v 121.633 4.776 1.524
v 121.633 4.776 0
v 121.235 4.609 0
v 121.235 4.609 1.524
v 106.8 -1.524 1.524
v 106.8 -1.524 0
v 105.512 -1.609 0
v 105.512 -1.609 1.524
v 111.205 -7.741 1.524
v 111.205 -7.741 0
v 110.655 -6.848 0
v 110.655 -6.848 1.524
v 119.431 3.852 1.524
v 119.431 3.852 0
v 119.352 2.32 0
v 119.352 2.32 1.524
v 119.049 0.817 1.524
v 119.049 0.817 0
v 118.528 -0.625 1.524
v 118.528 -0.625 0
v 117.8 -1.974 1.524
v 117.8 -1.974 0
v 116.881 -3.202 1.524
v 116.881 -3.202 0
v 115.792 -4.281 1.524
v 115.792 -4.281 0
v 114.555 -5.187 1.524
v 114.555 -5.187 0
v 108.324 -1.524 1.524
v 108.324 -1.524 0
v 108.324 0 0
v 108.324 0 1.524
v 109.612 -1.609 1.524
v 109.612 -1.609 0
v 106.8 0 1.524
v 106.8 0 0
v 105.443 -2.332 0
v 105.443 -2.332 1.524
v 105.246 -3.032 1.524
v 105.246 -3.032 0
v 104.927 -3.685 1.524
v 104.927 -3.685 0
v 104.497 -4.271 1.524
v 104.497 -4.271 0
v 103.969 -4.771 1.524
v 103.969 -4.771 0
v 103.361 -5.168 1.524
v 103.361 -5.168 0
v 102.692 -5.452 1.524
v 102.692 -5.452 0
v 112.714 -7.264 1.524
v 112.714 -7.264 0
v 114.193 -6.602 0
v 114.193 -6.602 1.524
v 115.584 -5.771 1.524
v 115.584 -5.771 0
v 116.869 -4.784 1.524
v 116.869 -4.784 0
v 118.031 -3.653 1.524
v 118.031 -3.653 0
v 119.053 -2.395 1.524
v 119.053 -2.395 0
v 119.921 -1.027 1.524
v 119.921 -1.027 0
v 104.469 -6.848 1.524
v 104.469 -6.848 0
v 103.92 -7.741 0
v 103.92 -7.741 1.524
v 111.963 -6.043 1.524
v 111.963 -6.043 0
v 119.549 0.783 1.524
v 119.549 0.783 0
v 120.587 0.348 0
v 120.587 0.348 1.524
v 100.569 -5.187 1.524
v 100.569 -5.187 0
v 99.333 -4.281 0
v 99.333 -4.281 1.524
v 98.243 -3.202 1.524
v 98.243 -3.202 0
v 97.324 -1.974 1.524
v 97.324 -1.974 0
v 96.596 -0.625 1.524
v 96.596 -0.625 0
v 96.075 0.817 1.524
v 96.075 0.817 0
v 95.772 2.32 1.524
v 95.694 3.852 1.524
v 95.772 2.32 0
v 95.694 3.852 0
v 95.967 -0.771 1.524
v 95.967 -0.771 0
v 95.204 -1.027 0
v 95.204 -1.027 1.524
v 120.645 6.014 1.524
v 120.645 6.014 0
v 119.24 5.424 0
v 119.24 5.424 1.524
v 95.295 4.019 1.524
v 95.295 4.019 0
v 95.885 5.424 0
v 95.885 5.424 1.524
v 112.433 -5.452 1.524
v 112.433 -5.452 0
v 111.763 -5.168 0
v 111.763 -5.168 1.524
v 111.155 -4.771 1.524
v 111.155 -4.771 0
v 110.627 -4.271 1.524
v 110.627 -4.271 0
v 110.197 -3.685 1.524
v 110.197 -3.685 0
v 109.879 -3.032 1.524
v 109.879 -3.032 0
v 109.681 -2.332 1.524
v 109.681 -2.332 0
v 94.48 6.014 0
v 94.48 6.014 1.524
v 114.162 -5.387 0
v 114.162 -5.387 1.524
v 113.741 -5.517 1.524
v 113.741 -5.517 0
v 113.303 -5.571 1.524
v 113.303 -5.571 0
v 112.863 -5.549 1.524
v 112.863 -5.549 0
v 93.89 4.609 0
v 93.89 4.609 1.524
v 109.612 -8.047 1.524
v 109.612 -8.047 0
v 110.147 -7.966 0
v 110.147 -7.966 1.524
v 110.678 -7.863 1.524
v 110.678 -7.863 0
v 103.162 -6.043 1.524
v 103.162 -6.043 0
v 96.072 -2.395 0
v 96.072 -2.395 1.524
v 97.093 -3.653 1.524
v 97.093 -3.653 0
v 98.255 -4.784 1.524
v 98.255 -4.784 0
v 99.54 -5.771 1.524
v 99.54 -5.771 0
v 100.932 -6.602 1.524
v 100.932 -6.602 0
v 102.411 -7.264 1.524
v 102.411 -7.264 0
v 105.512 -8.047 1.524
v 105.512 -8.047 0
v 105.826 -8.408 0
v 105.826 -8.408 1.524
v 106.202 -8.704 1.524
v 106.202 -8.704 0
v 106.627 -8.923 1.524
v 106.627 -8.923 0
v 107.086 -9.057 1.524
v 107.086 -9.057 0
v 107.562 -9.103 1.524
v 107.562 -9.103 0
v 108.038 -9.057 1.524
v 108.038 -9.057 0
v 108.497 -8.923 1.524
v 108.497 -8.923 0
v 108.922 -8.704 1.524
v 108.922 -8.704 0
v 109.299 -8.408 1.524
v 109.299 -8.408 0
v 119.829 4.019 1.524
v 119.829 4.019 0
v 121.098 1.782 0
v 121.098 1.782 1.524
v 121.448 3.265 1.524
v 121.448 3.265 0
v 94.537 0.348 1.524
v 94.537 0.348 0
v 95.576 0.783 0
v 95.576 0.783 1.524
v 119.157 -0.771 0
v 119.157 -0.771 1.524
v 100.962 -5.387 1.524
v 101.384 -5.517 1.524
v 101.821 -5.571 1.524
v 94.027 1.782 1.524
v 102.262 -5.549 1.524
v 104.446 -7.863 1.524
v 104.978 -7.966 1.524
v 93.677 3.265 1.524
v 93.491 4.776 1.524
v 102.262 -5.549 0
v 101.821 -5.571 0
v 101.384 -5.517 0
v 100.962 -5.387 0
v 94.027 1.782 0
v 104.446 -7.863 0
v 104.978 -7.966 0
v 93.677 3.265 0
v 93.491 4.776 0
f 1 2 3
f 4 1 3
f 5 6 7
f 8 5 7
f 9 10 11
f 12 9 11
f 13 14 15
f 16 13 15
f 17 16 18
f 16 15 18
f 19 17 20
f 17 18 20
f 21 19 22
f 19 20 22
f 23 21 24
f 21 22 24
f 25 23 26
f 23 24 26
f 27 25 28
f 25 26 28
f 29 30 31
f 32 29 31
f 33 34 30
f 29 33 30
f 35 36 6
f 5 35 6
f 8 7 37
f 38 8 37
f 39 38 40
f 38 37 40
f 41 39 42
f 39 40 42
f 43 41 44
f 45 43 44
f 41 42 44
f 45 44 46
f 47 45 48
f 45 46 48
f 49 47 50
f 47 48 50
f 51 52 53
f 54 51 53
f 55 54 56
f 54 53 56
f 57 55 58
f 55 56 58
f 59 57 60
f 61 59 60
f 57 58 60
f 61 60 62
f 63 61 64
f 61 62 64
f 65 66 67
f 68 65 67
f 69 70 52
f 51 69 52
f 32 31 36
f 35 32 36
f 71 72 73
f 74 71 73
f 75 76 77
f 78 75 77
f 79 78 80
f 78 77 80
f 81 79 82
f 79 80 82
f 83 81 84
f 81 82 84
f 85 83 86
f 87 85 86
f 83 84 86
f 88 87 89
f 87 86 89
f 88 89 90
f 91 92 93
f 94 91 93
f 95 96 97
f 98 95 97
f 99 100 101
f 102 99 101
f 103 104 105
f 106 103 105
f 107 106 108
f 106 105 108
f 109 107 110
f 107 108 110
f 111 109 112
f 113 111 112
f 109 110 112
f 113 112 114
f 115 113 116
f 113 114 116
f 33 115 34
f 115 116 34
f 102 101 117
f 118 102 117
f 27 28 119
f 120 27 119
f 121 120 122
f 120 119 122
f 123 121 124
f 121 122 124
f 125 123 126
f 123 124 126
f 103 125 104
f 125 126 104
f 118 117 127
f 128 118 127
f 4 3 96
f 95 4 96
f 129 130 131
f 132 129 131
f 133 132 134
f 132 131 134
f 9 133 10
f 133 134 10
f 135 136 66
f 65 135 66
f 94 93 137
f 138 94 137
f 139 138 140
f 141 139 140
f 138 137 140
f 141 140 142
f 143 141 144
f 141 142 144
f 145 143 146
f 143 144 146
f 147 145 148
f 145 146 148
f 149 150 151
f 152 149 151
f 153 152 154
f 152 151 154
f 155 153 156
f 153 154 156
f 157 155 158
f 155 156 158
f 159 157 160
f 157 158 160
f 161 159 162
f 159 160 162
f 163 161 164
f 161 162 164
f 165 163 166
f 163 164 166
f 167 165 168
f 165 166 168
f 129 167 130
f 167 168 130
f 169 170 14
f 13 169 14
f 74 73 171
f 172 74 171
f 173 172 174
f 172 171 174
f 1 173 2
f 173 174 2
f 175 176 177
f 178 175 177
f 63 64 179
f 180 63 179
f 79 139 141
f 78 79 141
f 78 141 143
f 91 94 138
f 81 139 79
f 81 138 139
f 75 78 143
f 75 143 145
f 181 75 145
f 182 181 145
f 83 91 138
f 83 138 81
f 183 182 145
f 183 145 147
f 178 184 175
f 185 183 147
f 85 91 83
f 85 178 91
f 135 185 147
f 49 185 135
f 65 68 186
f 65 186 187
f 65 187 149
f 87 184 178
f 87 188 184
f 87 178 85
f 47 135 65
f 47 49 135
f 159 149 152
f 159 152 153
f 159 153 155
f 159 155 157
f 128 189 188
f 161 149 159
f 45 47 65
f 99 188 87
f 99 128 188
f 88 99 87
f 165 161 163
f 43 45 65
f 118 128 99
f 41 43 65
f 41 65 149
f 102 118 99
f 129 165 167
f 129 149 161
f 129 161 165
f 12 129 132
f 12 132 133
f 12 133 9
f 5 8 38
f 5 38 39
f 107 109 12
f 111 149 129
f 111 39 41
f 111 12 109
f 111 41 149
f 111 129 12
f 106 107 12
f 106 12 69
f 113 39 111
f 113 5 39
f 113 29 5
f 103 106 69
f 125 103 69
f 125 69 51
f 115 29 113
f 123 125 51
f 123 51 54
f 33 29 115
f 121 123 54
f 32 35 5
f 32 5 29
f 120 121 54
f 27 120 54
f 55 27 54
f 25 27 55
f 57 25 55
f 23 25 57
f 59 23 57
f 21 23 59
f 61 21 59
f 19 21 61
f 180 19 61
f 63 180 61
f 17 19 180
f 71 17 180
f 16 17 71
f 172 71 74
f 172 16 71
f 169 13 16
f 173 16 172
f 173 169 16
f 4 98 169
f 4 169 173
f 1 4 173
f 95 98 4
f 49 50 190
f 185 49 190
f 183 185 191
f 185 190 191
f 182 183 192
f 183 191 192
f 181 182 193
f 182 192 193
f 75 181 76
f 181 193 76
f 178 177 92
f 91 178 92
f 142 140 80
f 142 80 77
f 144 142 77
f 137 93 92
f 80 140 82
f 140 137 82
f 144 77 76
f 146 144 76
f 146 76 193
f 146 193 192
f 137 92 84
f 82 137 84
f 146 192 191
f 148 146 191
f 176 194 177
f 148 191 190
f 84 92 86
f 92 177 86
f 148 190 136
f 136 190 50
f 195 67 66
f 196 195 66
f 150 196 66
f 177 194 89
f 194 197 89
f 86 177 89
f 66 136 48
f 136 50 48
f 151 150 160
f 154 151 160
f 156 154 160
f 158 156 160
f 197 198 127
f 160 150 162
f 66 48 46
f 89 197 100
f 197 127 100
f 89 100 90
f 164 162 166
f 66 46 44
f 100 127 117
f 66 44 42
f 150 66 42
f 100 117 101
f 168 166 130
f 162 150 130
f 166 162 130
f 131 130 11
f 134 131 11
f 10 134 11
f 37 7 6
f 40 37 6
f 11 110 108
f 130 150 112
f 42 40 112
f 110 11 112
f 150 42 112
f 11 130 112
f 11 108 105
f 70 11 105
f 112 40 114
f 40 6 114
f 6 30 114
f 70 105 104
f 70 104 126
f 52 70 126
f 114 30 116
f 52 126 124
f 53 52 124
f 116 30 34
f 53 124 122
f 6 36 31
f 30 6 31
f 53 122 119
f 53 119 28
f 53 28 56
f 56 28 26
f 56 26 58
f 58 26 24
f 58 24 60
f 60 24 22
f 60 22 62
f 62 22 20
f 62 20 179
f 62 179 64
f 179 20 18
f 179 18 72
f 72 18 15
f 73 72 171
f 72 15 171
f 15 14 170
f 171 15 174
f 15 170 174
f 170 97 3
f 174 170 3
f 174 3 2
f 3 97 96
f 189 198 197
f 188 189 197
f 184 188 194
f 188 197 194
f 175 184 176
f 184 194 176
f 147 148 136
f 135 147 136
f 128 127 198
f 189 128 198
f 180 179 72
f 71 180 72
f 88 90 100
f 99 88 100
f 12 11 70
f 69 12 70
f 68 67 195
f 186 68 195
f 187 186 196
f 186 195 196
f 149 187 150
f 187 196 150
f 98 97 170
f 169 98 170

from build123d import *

# Parameters (mm, degrees)
BOSS_EXTRUDE1_DEPTH = 1.524


with BuildPart() as part:
    # Sketch1 → Boss-Extrude1 (new body)
    with BuildSketch(Plane.XY):
        with BuildLine():
            Line((108.324157749, 0), (107.562157749, 0))
            Line((107.562157749, 0), (106.800157749, 0))
            Line((106.800157749, 0), (106.800157749, -1.524))
            Line((106.800157749, -1.524), (105.512237426, -1.608526345))
            ThreePointArc((105.512237426, -1.608526345), (104.724998688, -3.987284572), (102.691709144, -5.451514459))
            ThreePointArc((102.691709144, -5.451514459), (101.601320714, -5.553518588), (100.569337767, -5.186963043))
            ThreePointArc((100.569337767, -5.186963043), (96.93524901, -1.312980348), (95.693576873, 3.851571261))
            Line((95.693576873, 3.851571261), (95.294914698, 4.01890801))
            Line((95.294914698, 4.01890801), (95.88475327, 5.424136269))
            Line((95.88475327, 5.424136269), (94.479525012, 6.013974841))
            Line((94.479525012, 6.013974841), (93.889686439, 4.608746583))
            Line((93.889686439, 4.608746583), (93.491024264, 4.776083332))
            ThreePointArc((93.491024264, 4.776083332), (93.831172669, 2.518689403), (94.536866699, 0.347624174))
            Line((94.536866699, 0.347624174), (95.57577022, 0.782745178))
            Line((95.57577022, 0.782745178), (95.966908102, -0.770781875))
            Line((95.966908102, -0.770781875), (95.203689029, -1.026803893))
            ThreePointArc((95.203689029, -1.026803893), (98.254836233, -4.783797634), (102.410778326, -7.264250525))
            Line((102.410778326, -7.264250525), (103.161744097, -6.043467632))
            Line((103.161744097, -6.043467632), (104.468983276, -6.847617069))
            Line((104.468983276, -6.847617069), (103.919709272, -7.740526353))
            ThreePointArc((103.919709272, -7.740526353), (104.711489507, -7.917129066), (105.512237426, -8.047156867))
            ThreePointArc((105.512237426, -8.047156867), (107.562157749, -9.102849891), (109.612078072, -8.047156867))
            ThreePointArc((109.612078072, -8.047156867), (110.412825991, -7.917129066), (111.204606226, -7.740526353))
            Line((111.204606226, -7.740526353), (110.655332222, -6.847617069))
            Line((110.655332222, -6.847617069), (111.962571401, -6.043467632))
            Line((111.962571401, -6.043467632), (112.713537171, -7.264250525))
            ThreePointArc((112.713537171, -7.264250525), (116.869479265, -4.783797634), (119.920626468, -1.026803893))
            Line((119.920626468, -1.026803893), (119.157407395, -0.770781875))
            Line((119.157407395, -0.770781875), (119.548545278, 0.782745178))
            Line((119.548545278, 0.782745178), (120.587448799, 0.347624174))
            ThreePointArc((120.587448799, 0.347624174), (121.293142829, 2.518689403), (121.633291234, 4.776083332))
            Line((121.633291234, 4.776083332), (121.234629058, 4.608746583))
            Line((121.234629058, 4.608746583), (120.644790486, 6.013974841))
            Line((120.644790486, 6.013974841), (119.239562227, 5.424136269))
            Line((119.239562227, 5.424136269), (119.8294008, 4.01890801))
            Line((119.8294008, 4.01890801), (119.430738625, 3.851571261))
            ThreePointArc((119.430738625, 3.851571261), (118.189066488, -1.312980348), (114.55497773, -5.186963043))
            ThreePointArc((114.55497773, -5.186963043), (113.522994784, -5.553518588), (112.432606354, -5.451514459))
            ThreePointArc((112.432606354, -5.451514459), (110.399316809, -3.987284572), (109.612078072, -1.608526345))
            Line((109.612078072, -1.608526345), (108.324157749, -1.524))
            Line((108.324157749, -1.524), (108.324157749, 0))
        make_face()
    extrude(amount=BOSS_EXTRUDE1_DEPTH)


solid = part.part
